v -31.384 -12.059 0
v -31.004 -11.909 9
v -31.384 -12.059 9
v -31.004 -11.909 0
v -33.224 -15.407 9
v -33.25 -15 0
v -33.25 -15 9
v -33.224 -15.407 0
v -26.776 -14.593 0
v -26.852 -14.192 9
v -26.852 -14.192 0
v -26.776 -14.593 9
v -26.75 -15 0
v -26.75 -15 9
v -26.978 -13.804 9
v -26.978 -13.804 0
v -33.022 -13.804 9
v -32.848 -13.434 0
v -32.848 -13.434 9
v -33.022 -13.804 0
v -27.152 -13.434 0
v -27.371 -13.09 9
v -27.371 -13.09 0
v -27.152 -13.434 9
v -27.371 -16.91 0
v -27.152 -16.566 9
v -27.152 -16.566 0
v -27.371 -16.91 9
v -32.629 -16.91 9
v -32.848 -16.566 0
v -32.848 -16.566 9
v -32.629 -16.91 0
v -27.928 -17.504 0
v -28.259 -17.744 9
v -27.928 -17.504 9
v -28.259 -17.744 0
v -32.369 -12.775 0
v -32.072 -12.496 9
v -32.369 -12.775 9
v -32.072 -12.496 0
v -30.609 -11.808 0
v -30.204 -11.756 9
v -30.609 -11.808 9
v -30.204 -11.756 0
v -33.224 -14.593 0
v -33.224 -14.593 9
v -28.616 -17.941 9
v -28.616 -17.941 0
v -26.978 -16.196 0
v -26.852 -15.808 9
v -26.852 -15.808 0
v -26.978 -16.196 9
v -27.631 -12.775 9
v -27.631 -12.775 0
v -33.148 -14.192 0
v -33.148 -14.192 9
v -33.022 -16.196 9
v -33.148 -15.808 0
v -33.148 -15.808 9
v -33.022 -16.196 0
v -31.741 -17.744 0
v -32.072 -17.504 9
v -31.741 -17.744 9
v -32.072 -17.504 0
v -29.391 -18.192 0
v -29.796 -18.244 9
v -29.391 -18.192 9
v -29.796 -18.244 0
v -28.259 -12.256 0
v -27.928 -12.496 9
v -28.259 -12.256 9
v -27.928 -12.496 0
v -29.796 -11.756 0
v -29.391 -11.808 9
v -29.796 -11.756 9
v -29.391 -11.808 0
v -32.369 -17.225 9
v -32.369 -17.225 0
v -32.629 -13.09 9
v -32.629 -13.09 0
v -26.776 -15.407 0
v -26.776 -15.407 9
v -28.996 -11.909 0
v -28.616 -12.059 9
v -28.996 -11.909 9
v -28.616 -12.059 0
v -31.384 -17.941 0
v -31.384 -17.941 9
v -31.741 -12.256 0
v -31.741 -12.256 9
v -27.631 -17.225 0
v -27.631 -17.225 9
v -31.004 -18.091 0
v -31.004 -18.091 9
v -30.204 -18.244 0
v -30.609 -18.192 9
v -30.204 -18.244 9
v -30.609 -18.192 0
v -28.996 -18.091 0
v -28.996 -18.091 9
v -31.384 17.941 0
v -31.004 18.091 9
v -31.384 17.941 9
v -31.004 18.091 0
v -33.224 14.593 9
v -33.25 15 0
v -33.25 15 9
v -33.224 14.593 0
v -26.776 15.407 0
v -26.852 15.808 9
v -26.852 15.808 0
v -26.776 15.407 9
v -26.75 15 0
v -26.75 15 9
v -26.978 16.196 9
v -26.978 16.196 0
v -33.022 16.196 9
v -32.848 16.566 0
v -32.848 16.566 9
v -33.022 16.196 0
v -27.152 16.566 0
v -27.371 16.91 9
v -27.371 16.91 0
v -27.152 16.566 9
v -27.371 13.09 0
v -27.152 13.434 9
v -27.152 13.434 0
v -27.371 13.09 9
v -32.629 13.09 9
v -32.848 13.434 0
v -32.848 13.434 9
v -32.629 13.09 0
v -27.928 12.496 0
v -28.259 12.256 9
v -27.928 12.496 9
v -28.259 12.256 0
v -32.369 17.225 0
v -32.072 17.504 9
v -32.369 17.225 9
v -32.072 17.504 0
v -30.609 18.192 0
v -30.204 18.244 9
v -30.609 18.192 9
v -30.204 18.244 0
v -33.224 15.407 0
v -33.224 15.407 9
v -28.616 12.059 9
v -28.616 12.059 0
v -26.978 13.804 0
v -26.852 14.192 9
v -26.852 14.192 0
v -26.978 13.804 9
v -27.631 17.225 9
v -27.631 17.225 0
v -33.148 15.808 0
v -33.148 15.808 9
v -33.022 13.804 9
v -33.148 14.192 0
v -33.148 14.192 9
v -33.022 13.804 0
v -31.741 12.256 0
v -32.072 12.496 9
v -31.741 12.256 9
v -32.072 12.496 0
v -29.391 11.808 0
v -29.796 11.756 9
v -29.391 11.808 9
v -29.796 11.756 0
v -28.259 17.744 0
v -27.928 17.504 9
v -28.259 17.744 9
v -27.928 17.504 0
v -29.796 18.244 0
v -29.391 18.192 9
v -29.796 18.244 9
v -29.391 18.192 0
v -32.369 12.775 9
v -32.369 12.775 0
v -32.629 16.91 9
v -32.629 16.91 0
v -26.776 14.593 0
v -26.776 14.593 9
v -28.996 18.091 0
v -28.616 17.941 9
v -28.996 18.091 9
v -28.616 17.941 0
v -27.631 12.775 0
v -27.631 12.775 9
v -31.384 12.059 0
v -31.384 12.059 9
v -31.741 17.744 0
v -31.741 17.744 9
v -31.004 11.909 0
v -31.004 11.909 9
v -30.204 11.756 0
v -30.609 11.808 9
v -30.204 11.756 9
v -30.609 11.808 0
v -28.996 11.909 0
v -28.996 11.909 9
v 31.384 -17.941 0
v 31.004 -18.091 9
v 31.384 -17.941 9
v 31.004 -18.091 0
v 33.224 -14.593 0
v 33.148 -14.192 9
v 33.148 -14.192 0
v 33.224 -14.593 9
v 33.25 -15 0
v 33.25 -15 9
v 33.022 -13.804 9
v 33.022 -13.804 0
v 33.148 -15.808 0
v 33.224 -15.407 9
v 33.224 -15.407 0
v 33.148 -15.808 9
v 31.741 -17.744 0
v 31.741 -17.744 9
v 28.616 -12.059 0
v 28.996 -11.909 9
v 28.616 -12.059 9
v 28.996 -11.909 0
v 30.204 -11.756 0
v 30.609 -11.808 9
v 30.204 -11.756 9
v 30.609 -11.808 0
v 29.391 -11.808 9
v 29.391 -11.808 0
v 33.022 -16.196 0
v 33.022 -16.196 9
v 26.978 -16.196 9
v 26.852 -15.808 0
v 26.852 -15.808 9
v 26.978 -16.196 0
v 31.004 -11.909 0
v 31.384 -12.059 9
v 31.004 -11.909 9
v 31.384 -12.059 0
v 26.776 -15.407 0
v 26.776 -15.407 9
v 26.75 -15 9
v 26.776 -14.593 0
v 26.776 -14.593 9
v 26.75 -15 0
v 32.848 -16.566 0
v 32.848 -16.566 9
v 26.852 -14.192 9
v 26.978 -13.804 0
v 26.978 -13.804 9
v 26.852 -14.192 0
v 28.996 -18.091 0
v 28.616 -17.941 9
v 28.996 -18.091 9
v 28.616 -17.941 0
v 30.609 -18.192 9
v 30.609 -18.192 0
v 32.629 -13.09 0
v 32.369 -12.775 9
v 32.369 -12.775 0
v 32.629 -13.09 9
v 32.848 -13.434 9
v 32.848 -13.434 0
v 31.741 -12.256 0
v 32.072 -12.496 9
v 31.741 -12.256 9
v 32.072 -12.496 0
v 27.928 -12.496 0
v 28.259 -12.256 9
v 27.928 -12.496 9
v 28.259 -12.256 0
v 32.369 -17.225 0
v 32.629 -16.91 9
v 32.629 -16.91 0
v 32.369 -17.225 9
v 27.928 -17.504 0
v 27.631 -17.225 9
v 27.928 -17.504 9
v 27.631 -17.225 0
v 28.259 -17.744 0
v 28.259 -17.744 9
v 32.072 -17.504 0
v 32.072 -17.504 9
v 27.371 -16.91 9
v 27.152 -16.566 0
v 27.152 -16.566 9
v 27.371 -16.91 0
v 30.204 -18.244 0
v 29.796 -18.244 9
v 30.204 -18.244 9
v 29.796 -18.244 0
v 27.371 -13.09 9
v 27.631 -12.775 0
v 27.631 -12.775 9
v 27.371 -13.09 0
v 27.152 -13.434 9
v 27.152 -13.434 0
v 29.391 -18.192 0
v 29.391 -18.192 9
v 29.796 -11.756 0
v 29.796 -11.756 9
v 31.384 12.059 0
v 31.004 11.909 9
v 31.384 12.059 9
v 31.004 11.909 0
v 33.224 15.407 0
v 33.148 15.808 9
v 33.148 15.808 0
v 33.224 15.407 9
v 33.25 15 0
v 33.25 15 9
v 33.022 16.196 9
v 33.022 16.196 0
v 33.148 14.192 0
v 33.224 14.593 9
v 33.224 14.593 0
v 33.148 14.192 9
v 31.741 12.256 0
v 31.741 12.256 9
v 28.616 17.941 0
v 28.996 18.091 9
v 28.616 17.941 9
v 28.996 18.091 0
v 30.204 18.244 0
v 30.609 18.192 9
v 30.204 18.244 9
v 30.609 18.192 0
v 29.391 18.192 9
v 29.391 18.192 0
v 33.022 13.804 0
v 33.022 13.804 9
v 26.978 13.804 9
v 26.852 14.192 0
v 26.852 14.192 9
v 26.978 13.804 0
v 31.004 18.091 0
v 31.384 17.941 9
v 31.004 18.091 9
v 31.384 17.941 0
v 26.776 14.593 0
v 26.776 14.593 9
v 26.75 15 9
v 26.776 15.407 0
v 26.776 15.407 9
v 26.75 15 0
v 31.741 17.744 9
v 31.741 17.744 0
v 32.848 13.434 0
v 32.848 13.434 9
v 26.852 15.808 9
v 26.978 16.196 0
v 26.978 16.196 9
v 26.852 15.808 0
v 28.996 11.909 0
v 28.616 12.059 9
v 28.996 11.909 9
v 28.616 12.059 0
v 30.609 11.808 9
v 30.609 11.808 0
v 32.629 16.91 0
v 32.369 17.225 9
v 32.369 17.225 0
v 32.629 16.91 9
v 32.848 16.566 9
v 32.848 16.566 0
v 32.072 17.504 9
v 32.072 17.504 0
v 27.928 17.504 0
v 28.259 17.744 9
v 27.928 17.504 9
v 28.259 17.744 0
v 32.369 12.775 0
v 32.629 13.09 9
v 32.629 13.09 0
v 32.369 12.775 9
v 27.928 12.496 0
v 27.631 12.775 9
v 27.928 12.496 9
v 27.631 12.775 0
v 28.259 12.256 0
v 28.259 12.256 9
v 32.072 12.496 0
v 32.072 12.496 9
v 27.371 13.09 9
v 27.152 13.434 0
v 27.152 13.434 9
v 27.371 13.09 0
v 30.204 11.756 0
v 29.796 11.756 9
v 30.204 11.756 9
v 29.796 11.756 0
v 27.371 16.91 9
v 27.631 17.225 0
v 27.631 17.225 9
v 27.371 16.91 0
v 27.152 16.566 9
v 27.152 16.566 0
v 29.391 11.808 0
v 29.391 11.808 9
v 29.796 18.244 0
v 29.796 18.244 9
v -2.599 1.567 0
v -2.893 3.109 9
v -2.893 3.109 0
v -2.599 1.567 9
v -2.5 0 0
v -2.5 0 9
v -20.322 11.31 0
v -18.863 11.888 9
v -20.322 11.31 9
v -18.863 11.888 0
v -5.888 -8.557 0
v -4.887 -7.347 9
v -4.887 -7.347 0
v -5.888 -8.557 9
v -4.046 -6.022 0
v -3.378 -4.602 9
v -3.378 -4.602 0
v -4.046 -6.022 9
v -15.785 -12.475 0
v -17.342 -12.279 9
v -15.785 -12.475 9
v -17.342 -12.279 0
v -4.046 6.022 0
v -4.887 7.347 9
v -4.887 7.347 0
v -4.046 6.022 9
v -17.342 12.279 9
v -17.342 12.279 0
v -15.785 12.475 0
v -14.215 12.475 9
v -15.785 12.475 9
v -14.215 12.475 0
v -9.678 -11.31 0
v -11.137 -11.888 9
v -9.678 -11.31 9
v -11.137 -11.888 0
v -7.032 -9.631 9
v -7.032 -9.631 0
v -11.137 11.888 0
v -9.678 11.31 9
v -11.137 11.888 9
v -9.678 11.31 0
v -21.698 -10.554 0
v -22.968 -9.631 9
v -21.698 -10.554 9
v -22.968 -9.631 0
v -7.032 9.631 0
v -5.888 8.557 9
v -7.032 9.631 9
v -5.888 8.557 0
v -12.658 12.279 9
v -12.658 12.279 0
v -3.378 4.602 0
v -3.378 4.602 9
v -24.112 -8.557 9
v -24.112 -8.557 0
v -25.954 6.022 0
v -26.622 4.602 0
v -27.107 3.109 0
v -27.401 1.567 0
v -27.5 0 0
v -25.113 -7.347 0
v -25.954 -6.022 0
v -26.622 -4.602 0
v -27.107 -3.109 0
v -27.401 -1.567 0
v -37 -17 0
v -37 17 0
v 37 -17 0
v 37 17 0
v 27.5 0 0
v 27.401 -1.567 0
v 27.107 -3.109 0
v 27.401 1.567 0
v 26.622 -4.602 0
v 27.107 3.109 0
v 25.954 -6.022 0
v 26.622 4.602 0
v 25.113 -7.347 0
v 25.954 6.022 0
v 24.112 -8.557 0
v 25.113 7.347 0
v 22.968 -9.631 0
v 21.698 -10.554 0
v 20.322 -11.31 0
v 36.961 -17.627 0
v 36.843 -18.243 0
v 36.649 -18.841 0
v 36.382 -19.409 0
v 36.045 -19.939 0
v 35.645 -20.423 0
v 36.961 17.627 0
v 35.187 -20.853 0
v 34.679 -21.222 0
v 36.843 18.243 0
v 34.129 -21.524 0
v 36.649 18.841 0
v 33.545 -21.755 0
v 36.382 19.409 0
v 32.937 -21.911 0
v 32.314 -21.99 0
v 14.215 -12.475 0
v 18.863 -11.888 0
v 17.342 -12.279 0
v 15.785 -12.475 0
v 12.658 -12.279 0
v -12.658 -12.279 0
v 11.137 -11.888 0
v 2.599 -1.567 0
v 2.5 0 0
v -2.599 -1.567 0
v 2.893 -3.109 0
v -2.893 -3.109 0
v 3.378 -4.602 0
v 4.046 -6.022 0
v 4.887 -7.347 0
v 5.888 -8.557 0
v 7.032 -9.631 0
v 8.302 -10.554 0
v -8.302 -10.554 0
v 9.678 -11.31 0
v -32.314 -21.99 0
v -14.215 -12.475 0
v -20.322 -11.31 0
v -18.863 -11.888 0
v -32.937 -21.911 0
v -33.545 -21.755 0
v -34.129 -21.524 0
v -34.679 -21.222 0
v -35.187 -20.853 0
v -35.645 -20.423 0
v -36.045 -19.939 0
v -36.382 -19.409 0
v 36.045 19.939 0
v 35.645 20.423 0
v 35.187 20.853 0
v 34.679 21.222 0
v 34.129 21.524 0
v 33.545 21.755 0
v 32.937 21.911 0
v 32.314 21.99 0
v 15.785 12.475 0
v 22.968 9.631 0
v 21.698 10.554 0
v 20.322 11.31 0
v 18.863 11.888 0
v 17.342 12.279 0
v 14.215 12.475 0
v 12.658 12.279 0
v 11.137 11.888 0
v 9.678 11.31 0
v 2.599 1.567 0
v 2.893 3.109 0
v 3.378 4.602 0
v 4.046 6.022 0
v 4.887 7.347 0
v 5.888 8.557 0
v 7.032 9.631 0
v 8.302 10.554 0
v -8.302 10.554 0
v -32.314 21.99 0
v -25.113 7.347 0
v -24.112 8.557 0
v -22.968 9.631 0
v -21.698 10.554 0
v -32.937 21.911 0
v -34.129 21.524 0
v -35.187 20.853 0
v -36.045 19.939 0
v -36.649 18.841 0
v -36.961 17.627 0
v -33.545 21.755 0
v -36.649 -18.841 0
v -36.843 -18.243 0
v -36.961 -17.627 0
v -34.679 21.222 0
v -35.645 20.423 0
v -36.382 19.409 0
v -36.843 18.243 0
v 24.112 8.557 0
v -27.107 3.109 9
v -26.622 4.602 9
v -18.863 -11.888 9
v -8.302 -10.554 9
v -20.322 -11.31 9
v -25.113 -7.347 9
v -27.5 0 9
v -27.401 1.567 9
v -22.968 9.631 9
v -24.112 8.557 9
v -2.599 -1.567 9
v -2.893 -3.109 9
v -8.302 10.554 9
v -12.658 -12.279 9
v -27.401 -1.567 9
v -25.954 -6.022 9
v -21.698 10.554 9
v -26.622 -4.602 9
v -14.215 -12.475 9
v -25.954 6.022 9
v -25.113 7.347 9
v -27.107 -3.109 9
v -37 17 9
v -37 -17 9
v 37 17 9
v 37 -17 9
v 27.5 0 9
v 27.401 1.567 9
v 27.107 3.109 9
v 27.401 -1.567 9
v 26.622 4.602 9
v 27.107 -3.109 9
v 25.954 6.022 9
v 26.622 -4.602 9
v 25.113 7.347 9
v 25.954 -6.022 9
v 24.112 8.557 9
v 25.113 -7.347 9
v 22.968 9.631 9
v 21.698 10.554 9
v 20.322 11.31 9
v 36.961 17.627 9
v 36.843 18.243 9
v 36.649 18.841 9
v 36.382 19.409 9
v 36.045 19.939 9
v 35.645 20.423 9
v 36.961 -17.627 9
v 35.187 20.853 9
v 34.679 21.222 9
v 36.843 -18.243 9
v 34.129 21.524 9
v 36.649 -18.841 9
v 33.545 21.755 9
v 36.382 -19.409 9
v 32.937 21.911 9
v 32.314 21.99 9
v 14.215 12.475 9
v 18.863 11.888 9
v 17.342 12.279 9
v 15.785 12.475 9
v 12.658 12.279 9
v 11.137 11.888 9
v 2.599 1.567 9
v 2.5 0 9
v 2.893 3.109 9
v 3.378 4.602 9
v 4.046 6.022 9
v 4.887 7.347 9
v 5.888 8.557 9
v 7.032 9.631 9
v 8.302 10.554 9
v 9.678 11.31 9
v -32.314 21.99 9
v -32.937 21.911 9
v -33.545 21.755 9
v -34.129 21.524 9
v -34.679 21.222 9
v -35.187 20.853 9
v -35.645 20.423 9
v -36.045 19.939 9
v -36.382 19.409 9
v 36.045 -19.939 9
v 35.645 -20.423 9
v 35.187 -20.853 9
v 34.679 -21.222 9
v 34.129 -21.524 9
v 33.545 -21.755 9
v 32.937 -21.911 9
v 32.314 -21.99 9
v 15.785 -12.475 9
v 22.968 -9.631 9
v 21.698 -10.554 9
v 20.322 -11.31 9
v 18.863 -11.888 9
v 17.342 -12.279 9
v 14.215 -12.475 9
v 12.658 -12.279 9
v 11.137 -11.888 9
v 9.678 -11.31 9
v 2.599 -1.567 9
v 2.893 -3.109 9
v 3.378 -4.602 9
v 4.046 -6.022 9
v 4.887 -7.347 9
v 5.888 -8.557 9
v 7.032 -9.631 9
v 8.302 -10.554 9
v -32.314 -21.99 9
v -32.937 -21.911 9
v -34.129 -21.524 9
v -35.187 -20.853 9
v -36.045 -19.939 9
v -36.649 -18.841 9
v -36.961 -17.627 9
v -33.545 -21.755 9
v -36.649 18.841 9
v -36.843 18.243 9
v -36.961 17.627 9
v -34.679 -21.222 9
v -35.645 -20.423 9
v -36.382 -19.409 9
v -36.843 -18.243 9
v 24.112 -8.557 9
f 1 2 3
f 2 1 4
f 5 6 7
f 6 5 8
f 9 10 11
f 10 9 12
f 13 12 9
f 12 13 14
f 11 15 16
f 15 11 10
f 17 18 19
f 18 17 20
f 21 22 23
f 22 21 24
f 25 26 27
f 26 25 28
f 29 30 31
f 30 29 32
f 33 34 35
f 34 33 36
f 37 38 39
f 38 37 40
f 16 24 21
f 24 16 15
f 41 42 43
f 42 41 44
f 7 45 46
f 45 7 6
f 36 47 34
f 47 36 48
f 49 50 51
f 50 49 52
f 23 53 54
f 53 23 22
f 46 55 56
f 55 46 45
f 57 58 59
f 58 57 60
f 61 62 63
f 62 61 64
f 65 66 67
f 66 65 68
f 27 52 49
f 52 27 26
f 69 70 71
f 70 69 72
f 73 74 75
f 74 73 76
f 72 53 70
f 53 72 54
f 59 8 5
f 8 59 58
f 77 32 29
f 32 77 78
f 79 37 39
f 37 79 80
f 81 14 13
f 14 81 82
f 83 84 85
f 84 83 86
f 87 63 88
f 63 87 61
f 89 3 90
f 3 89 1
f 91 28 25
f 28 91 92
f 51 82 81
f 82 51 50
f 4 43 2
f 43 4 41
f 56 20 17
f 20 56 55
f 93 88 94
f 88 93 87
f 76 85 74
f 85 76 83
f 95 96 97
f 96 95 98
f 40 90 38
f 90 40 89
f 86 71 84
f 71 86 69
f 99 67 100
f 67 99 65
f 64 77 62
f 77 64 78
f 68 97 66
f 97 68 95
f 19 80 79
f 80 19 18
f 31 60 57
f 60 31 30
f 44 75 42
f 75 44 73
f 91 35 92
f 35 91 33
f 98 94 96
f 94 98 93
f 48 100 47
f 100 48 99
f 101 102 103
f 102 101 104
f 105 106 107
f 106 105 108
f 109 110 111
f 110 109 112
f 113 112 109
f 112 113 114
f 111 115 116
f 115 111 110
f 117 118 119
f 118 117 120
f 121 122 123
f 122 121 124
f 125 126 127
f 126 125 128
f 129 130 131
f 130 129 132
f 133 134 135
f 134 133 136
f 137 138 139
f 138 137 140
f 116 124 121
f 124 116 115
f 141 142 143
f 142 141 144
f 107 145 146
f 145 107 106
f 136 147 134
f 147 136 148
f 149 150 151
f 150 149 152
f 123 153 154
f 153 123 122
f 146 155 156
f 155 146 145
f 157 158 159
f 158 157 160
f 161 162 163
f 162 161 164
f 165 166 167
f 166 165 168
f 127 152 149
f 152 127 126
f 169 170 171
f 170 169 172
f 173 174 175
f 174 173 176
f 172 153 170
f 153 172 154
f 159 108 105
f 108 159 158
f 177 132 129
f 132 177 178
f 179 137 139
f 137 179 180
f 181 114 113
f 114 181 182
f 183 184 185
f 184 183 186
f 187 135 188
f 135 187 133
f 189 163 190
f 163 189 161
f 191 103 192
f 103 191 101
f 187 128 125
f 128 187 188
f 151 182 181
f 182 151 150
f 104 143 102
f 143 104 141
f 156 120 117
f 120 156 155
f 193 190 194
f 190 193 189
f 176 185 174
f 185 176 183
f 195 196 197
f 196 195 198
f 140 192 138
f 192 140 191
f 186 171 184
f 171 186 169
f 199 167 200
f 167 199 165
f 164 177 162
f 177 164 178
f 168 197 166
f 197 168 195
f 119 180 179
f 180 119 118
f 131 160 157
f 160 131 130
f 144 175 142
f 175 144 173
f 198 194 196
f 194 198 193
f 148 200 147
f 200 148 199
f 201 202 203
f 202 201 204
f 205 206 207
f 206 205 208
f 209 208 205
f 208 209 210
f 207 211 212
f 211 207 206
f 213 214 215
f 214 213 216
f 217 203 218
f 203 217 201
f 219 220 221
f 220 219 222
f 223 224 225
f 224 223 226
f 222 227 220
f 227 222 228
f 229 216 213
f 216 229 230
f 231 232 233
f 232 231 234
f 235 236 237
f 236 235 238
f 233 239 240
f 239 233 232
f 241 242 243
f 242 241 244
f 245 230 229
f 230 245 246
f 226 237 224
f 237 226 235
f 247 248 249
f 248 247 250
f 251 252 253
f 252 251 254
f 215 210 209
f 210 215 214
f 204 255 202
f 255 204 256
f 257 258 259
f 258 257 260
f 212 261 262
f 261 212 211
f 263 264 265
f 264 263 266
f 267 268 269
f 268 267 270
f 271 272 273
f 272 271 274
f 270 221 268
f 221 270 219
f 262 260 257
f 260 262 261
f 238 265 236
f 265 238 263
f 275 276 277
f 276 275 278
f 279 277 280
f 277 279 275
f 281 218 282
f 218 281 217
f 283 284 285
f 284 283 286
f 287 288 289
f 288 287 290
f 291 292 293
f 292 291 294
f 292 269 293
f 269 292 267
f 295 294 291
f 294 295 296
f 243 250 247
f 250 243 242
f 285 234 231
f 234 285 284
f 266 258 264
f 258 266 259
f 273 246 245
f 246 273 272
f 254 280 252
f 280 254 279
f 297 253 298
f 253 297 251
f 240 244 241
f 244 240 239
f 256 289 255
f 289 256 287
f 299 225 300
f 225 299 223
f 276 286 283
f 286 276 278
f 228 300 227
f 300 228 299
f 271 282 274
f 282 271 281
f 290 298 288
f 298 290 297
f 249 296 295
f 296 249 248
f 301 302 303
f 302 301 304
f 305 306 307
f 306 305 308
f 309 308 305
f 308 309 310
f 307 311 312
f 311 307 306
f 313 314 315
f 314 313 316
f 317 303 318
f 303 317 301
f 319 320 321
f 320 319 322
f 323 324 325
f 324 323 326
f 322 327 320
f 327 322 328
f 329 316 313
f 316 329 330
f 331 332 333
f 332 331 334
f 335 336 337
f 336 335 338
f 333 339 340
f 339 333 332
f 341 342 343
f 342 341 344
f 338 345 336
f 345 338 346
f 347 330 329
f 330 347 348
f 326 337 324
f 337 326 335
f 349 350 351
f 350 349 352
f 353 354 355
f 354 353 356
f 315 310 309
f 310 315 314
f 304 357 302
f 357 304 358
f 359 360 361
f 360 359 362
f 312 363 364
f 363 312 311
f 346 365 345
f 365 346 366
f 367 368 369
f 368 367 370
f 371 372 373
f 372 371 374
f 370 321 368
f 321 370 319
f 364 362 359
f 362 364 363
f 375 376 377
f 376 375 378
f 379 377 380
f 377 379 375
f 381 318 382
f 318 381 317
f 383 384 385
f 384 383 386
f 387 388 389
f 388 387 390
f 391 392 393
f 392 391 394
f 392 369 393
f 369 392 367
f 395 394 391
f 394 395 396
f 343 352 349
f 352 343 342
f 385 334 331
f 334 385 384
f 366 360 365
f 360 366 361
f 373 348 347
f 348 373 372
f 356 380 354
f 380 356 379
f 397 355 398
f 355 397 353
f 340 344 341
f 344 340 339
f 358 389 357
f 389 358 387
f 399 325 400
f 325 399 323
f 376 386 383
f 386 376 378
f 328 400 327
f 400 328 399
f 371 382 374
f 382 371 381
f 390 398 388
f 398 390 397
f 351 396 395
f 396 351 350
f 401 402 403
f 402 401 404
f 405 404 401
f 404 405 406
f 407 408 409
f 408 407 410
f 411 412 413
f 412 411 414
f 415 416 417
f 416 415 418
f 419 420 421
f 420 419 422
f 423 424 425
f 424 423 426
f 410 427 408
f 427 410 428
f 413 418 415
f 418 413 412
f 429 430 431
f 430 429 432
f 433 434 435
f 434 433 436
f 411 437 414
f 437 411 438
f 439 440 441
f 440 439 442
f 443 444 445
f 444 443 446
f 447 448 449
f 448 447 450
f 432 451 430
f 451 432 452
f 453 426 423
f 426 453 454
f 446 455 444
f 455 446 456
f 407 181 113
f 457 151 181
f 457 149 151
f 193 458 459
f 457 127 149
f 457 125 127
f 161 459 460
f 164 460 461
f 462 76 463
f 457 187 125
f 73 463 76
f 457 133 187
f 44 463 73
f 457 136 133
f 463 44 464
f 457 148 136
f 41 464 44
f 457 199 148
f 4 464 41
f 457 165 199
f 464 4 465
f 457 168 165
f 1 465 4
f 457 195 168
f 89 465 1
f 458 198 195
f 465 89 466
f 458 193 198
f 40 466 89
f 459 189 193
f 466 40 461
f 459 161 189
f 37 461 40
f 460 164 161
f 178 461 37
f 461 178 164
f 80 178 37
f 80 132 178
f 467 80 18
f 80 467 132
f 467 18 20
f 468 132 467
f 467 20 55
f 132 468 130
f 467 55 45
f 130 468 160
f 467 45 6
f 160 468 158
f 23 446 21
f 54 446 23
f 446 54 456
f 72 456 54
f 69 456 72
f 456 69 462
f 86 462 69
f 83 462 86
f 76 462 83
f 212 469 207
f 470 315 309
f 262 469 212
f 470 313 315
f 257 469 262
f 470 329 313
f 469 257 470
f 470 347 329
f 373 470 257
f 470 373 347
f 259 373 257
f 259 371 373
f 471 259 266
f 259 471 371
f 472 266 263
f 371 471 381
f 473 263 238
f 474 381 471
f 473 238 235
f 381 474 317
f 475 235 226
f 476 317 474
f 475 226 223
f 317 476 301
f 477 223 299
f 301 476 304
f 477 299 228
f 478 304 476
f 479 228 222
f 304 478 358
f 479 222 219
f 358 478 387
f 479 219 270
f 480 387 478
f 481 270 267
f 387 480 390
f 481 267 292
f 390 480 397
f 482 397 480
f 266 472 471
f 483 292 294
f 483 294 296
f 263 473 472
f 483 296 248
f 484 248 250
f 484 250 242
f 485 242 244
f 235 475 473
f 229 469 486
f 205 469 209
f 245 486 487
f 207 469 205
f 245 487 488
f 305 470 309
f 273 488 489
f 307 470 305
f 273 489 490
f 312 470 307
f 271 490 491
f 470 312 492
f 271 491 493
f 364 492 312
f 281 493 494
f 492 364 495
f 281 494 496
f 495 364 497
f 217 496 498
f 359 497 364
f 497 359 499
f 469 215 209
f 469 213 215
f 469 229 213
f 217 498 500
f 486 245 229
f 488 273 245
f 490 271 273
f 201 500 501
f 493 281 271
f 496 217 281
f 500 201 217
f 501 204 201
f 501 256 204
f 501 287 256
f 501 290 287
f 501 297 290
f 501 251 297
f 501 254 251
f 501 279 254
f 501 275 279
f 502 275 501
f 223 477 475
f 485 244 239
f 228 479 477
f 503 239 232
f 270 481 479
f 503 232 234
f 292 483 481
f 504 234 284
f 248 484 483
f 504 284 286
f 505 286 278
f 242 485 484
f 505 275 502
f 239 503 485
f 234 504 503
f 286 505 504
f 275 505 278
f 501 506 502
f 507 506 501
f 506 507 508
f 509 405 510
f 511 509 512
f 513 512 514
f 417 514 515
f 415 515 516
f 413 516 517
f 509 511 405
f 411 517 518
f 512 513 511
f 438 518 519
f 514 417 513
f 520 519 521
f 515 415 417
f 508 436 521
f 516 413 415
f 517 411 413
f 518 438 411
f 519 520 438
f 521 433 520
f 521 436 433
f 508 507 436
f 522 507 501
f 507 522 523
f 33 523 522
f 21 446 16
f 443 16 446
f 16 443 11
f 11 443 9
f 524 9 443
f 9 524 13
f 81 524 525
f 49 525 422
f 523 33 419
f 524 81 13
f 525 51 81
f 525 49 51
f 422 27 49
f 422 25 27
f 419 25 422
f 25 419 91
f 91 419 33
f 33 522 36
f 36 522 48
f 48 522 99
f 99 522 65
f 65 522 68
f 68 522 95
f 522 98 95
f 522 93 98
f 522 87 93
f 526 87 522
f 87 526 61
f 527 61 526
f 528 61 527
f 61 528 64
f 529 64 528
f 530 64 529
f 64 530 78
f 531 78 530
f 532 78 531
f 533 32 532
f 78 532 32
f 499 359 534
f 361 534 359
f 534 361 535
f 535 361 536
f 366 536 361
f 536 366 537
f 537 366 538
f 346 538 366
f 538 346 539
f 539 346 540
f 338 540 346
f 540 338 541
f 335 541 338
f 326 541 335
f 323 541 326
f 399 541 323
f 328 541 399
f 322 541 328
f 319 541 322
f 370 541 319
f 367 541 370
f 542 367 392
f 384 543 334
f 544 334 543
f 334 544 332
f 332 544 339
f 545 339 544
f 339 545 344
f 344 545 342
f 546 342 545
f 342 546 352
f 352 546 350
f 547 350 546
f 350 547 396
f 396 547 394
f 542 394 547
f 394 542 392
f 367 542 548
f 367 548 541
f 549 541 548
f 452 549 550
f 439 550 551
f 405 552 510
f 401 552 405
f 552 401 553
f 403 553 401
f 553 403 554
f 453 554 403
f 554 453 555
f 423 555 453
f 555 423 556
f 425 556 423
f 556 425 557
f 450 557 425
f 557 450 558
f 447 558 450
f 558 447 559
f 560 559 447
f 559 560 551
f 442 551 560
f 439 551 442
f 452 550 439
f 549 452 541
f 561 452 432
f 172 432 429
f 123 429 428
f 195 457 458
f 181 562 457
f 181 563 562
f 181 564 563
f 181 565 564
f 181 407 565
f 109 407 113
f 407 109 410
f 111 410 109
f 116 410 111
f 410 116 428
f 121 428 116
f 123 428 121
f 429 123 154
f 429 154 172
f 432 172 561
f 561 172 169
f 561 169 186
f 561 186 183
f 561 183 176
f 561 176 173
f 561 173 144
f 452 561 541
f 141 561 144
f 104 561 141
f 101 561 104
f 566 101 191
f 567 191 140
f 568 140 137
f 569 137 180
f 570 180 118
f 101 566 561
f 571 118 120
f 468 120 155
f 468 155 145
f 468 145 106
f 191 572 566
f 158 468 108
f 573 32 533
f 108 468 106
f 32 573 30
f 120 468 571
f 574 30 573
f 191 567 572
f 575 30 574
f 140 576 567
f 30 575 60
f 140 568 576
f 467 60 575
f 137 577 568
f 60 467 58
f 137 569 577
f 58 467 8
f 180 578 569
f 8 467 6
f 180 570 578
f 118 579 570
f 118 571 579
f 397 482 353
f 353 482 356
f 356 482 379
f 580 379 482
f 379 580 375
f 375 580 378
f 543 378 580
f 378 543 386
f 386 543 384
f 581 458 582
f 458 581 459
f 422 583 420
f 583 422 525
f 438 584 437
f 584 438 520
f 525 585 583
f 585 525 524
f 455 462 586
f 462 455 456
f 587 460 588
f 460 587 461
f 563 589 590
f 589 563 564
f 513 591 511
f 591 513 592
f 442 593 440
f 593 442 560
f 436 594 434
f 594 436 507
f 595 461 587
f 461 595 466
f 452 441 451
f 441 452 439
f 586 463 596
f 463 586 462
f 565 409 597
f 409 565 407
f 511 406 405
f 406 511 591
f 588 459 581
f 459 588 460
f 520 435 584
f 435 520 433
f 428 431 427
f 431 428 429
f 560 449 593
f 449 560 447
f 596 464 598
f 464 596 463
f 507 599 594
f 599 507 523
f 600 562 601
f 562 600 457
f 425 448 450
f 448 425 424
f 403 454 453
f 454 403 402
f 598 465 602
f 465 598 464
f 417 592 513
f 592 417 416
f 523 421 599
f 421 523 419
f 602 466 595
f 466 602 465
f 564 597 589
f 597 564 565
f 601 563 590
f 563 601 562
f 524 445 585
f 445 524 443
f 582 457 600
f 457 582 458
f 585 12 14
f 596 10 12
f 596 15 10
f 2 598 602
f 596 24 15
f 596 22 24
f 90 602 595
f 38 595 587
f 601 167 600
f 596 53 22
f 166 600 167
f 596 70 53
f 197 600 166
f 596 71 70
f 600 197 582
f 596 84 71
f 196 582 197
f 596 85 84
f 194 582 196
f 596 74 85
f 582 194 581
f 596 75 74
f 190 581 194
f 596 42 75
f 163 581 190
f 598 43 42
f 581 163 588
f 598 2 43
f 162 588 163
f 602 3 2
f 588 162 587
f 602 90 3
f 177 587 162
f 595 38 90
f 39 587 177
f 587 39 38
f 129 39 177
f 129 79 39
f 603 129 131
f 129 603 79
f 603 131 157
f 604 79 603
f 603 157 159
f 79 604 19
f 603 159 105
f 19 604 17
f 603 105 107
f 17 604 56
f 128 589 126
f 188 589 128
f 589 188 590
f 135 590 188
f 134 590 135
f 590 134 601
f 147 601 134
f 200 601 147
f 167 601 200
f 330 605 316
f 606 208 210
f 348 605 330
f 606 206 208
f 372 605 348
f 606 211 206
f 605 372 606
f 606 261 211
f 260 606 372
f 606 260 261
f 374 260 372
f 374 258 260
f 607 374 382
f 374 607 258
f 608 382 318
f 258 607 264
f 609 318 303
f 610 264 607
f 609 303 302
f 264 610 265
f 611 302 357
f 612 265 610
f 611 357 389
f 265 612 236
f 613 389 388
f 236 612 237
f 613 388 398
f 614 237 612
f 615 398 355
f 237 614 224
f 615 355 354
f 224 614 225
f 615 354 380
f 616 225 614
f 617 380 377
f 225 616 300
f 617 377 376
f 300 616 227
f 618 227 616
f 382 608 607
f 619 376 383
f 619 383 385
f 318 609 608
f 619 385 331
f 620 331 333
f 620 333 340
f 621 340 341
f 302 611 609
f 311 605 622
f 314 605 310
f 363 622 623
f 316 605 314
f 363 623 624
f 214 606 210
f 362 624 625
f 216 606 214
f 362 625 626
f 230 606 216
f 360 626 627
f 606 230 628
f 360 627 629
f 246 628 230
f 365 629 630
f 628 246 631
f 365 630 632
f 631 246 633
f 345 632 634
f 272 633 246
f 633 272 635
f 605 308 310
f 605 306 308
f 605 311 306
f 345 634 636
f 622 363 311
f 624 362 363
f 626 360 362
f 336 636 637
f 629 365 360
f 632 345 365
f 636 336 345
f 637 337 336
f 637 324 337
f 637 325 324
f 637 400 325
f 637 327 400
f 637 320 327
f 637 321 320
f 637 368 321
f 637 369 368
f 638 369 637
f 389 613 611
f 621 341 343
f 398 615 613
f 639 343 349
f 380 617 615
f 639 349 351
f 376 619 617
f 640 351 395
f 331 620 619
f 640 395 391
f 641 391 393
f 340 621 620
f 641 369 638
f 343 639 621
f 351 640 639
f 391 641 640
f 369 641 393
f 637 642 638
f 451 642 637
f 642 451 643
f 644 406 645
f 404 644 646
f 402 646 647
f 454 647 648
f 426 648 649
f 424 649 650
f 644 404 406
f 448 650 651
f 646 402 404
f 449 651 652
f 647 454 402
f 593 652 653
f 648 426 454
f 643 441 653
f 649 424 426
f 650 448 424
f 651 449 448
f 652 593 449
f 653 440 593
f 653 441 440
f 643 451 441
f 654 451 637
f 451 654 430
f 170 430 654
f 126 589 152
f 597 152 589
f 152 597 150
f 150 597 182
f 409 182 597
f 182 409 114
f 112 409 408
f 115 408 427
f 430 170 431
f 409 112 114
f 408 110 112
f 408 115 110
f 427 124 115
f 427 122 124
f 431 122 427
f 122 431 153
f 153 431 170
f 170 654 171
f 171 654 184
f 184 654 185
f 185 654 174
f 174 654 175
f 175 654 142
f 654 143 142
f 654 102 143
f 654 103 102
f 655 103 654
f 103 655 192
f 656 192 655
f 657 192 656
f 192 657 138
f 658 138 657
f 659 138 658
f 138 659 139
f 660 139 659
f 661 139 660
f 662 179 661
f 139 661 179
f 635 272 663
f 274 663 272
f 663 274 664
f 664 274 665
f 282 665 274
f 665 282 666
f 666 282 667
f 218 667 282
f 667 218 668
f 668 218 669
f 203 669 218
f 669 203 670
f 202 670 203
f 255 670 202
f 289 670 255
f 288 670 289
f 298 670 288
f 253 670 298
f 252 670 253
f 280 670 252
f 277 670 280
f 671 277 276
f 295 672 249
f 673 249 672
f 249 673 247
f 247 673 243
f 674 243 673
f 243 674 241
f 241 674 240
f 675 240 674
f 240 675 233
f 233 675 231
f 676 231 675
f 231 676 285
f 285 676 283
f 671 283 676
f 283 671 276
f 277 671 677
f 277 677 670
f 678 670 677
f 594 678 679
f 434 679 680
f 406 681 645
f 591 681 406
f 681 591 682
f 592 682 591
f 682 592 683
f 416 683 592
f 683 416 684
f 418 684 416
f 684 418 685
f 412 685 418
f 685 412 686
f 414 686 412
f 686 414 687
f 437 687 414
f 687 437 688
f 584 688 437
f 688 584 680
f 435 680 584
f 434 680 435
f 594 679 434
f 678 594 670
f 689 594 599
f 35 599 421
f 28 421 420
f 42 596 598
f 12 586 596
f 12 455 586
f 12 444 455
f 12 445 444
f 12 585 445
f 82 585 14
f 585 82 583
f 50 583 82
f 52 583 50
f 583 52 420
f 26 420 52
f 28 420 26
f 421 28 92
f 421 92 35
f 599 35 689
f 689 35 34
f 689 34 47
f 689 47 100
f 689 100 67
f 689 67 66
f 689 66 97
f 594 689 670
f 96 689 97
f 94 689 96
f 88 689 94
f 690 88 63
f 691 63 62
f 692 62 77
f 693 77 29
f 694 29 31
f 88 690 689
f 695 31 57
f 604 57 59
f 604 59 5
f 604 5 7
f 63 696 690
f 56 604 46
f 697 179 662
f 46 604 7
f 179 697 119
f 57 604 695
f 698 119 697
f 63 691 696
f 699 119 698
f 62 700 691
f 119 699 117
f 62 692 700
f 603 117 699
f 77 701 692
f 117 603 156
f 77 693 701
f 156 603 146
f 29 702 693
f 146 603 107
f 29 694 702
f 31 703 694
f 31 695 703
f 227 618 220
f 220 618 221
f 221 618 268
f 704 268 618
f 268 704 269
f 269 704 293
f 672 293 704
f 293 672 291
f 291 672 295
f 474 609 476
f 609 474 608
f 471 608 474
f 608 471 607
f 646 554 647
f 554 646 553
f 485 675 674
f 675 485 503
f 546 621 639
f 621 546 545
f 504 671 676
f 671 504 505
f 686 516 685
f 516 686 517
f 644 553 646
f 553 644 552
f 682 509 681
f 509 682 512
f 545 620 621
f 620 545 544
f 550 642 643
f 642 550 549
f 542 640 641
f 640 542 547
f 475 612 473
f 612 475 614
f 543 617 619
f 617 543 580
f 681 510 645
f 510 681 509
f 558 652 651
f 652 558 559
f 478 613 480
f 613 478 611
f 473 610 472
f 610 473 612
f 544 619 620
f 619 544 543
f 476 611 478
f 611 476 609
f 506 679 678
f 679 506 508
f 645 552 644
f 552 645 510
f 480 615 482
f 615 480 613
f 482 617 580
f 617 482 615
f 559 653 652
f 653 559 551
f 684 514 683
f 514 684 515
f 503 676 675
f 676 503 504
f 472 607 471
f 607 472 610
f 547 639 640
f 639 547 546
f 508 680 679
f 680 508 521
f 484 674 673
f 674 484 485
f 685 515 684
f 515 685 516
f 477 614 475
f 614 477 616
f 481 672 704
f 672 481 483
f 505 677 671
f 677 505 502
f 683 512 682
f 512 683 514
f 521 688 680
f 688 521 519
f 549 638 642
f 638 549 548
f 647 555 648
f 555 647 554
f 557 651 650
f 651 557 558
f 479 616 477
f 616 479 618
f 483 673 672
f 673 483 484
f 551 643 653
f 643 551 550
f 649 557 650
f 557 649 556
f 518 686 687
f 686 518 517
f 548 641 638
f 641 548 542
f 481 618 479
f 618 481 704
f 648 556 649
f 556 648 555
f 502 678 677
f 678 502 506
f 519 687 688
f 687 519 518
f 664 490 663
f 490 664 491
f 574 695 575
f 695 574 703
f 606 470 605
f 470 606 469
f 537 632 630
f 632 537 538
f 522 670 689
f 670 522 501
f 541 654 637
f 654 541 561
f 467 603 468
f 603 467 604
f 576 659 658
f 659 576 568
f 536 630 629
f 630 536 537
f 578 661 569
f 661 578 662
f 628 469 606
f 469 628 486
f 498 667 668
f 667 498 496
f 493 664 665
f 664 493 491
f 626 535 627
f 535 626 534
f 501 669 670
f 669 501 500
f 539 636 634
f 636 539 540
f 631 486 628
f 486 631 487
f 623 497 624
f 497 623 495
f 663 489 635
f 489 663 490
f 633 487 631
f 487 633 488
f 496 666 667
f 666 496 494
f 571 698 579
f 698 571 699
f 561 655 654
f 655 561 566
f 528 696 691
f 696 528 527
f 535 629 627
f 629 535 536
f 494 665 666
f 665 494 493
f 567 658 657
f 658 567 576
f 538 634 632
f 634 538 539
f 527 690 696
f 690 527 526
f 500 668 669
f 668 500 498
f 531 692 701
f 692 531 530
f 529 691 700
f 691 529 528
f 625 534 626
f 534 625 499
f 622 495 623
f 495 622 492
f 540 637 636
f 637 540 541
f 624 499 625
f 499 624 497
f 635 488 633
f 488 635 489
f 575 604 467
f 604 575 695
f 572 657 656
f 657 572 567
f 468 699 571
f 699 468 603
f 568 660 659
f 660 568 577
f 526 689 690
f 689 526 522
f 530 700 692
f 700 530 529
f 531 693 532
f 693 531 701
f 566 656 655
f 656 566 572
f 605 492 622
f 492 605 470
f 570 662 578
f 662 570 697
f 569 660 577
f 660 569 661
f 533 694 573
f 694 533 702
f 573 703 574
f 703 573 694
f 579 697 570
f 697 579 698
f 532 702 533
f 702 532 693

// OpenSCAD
$fn = 50;

difference() {
	union() {
		hull() {
			translate(v = [-32.0, 17.0, 0]) {
				cylinder(h = 9, r = 5);
			}
			translate(v = [32.0, 17.0, 0]) {
				cylinder(h = 9, r = 5);
			}
			translate(v = [-32.0, -17.0, 0]) {
				cylinder(h = 9, r = 5);
			}
			translate(v = [32.0, -17.0, 0]) {
				cylinder(h = 9, r = 5);
			}
		}
	}
	union() {
		translate(v = [-30.0, -15.0, -100.0]) {
			cylinder(h = 200, r = 3.25);
		}
		translate(v = [-30.0, 15.0, -100.0]) {
			cylinder(h = 200, r = 3.25);
		}
		translate(v = [30.0, -15.0, -100.0]) {
			cylinder(h = 200, r = 3.25);
		}
		translate(v = [30.0, 15.0, -100.0]) {
			cylinder(h = 200, r = 3.25);
		}
		translate(v = [-30.0, -15.0, -100.0]) {
			cylinder(h = 200, r = 1.8);
		}
		translate(v = [-30.0, 15.0, -100.0]) {
			cylinder(h = 200, r = 1.8);
		}
		translate(v = [30.0, -15.0, -100.0]) {
			cylinder(h = 200, r = 1.8);
		}
		translate(v = [30.0, 15.0, -100.0]) {
			cylinder(h = 200, r = 1.8);
		}
		translate(v = [-15.0, 0, 0.0]) {
			cylinder(h = 9, r = 12.5);
		}
		translate(v = [15.0, 0, 0.0]) {
			cylinder(h = 9, r = 12.5);
		}
	}
}
